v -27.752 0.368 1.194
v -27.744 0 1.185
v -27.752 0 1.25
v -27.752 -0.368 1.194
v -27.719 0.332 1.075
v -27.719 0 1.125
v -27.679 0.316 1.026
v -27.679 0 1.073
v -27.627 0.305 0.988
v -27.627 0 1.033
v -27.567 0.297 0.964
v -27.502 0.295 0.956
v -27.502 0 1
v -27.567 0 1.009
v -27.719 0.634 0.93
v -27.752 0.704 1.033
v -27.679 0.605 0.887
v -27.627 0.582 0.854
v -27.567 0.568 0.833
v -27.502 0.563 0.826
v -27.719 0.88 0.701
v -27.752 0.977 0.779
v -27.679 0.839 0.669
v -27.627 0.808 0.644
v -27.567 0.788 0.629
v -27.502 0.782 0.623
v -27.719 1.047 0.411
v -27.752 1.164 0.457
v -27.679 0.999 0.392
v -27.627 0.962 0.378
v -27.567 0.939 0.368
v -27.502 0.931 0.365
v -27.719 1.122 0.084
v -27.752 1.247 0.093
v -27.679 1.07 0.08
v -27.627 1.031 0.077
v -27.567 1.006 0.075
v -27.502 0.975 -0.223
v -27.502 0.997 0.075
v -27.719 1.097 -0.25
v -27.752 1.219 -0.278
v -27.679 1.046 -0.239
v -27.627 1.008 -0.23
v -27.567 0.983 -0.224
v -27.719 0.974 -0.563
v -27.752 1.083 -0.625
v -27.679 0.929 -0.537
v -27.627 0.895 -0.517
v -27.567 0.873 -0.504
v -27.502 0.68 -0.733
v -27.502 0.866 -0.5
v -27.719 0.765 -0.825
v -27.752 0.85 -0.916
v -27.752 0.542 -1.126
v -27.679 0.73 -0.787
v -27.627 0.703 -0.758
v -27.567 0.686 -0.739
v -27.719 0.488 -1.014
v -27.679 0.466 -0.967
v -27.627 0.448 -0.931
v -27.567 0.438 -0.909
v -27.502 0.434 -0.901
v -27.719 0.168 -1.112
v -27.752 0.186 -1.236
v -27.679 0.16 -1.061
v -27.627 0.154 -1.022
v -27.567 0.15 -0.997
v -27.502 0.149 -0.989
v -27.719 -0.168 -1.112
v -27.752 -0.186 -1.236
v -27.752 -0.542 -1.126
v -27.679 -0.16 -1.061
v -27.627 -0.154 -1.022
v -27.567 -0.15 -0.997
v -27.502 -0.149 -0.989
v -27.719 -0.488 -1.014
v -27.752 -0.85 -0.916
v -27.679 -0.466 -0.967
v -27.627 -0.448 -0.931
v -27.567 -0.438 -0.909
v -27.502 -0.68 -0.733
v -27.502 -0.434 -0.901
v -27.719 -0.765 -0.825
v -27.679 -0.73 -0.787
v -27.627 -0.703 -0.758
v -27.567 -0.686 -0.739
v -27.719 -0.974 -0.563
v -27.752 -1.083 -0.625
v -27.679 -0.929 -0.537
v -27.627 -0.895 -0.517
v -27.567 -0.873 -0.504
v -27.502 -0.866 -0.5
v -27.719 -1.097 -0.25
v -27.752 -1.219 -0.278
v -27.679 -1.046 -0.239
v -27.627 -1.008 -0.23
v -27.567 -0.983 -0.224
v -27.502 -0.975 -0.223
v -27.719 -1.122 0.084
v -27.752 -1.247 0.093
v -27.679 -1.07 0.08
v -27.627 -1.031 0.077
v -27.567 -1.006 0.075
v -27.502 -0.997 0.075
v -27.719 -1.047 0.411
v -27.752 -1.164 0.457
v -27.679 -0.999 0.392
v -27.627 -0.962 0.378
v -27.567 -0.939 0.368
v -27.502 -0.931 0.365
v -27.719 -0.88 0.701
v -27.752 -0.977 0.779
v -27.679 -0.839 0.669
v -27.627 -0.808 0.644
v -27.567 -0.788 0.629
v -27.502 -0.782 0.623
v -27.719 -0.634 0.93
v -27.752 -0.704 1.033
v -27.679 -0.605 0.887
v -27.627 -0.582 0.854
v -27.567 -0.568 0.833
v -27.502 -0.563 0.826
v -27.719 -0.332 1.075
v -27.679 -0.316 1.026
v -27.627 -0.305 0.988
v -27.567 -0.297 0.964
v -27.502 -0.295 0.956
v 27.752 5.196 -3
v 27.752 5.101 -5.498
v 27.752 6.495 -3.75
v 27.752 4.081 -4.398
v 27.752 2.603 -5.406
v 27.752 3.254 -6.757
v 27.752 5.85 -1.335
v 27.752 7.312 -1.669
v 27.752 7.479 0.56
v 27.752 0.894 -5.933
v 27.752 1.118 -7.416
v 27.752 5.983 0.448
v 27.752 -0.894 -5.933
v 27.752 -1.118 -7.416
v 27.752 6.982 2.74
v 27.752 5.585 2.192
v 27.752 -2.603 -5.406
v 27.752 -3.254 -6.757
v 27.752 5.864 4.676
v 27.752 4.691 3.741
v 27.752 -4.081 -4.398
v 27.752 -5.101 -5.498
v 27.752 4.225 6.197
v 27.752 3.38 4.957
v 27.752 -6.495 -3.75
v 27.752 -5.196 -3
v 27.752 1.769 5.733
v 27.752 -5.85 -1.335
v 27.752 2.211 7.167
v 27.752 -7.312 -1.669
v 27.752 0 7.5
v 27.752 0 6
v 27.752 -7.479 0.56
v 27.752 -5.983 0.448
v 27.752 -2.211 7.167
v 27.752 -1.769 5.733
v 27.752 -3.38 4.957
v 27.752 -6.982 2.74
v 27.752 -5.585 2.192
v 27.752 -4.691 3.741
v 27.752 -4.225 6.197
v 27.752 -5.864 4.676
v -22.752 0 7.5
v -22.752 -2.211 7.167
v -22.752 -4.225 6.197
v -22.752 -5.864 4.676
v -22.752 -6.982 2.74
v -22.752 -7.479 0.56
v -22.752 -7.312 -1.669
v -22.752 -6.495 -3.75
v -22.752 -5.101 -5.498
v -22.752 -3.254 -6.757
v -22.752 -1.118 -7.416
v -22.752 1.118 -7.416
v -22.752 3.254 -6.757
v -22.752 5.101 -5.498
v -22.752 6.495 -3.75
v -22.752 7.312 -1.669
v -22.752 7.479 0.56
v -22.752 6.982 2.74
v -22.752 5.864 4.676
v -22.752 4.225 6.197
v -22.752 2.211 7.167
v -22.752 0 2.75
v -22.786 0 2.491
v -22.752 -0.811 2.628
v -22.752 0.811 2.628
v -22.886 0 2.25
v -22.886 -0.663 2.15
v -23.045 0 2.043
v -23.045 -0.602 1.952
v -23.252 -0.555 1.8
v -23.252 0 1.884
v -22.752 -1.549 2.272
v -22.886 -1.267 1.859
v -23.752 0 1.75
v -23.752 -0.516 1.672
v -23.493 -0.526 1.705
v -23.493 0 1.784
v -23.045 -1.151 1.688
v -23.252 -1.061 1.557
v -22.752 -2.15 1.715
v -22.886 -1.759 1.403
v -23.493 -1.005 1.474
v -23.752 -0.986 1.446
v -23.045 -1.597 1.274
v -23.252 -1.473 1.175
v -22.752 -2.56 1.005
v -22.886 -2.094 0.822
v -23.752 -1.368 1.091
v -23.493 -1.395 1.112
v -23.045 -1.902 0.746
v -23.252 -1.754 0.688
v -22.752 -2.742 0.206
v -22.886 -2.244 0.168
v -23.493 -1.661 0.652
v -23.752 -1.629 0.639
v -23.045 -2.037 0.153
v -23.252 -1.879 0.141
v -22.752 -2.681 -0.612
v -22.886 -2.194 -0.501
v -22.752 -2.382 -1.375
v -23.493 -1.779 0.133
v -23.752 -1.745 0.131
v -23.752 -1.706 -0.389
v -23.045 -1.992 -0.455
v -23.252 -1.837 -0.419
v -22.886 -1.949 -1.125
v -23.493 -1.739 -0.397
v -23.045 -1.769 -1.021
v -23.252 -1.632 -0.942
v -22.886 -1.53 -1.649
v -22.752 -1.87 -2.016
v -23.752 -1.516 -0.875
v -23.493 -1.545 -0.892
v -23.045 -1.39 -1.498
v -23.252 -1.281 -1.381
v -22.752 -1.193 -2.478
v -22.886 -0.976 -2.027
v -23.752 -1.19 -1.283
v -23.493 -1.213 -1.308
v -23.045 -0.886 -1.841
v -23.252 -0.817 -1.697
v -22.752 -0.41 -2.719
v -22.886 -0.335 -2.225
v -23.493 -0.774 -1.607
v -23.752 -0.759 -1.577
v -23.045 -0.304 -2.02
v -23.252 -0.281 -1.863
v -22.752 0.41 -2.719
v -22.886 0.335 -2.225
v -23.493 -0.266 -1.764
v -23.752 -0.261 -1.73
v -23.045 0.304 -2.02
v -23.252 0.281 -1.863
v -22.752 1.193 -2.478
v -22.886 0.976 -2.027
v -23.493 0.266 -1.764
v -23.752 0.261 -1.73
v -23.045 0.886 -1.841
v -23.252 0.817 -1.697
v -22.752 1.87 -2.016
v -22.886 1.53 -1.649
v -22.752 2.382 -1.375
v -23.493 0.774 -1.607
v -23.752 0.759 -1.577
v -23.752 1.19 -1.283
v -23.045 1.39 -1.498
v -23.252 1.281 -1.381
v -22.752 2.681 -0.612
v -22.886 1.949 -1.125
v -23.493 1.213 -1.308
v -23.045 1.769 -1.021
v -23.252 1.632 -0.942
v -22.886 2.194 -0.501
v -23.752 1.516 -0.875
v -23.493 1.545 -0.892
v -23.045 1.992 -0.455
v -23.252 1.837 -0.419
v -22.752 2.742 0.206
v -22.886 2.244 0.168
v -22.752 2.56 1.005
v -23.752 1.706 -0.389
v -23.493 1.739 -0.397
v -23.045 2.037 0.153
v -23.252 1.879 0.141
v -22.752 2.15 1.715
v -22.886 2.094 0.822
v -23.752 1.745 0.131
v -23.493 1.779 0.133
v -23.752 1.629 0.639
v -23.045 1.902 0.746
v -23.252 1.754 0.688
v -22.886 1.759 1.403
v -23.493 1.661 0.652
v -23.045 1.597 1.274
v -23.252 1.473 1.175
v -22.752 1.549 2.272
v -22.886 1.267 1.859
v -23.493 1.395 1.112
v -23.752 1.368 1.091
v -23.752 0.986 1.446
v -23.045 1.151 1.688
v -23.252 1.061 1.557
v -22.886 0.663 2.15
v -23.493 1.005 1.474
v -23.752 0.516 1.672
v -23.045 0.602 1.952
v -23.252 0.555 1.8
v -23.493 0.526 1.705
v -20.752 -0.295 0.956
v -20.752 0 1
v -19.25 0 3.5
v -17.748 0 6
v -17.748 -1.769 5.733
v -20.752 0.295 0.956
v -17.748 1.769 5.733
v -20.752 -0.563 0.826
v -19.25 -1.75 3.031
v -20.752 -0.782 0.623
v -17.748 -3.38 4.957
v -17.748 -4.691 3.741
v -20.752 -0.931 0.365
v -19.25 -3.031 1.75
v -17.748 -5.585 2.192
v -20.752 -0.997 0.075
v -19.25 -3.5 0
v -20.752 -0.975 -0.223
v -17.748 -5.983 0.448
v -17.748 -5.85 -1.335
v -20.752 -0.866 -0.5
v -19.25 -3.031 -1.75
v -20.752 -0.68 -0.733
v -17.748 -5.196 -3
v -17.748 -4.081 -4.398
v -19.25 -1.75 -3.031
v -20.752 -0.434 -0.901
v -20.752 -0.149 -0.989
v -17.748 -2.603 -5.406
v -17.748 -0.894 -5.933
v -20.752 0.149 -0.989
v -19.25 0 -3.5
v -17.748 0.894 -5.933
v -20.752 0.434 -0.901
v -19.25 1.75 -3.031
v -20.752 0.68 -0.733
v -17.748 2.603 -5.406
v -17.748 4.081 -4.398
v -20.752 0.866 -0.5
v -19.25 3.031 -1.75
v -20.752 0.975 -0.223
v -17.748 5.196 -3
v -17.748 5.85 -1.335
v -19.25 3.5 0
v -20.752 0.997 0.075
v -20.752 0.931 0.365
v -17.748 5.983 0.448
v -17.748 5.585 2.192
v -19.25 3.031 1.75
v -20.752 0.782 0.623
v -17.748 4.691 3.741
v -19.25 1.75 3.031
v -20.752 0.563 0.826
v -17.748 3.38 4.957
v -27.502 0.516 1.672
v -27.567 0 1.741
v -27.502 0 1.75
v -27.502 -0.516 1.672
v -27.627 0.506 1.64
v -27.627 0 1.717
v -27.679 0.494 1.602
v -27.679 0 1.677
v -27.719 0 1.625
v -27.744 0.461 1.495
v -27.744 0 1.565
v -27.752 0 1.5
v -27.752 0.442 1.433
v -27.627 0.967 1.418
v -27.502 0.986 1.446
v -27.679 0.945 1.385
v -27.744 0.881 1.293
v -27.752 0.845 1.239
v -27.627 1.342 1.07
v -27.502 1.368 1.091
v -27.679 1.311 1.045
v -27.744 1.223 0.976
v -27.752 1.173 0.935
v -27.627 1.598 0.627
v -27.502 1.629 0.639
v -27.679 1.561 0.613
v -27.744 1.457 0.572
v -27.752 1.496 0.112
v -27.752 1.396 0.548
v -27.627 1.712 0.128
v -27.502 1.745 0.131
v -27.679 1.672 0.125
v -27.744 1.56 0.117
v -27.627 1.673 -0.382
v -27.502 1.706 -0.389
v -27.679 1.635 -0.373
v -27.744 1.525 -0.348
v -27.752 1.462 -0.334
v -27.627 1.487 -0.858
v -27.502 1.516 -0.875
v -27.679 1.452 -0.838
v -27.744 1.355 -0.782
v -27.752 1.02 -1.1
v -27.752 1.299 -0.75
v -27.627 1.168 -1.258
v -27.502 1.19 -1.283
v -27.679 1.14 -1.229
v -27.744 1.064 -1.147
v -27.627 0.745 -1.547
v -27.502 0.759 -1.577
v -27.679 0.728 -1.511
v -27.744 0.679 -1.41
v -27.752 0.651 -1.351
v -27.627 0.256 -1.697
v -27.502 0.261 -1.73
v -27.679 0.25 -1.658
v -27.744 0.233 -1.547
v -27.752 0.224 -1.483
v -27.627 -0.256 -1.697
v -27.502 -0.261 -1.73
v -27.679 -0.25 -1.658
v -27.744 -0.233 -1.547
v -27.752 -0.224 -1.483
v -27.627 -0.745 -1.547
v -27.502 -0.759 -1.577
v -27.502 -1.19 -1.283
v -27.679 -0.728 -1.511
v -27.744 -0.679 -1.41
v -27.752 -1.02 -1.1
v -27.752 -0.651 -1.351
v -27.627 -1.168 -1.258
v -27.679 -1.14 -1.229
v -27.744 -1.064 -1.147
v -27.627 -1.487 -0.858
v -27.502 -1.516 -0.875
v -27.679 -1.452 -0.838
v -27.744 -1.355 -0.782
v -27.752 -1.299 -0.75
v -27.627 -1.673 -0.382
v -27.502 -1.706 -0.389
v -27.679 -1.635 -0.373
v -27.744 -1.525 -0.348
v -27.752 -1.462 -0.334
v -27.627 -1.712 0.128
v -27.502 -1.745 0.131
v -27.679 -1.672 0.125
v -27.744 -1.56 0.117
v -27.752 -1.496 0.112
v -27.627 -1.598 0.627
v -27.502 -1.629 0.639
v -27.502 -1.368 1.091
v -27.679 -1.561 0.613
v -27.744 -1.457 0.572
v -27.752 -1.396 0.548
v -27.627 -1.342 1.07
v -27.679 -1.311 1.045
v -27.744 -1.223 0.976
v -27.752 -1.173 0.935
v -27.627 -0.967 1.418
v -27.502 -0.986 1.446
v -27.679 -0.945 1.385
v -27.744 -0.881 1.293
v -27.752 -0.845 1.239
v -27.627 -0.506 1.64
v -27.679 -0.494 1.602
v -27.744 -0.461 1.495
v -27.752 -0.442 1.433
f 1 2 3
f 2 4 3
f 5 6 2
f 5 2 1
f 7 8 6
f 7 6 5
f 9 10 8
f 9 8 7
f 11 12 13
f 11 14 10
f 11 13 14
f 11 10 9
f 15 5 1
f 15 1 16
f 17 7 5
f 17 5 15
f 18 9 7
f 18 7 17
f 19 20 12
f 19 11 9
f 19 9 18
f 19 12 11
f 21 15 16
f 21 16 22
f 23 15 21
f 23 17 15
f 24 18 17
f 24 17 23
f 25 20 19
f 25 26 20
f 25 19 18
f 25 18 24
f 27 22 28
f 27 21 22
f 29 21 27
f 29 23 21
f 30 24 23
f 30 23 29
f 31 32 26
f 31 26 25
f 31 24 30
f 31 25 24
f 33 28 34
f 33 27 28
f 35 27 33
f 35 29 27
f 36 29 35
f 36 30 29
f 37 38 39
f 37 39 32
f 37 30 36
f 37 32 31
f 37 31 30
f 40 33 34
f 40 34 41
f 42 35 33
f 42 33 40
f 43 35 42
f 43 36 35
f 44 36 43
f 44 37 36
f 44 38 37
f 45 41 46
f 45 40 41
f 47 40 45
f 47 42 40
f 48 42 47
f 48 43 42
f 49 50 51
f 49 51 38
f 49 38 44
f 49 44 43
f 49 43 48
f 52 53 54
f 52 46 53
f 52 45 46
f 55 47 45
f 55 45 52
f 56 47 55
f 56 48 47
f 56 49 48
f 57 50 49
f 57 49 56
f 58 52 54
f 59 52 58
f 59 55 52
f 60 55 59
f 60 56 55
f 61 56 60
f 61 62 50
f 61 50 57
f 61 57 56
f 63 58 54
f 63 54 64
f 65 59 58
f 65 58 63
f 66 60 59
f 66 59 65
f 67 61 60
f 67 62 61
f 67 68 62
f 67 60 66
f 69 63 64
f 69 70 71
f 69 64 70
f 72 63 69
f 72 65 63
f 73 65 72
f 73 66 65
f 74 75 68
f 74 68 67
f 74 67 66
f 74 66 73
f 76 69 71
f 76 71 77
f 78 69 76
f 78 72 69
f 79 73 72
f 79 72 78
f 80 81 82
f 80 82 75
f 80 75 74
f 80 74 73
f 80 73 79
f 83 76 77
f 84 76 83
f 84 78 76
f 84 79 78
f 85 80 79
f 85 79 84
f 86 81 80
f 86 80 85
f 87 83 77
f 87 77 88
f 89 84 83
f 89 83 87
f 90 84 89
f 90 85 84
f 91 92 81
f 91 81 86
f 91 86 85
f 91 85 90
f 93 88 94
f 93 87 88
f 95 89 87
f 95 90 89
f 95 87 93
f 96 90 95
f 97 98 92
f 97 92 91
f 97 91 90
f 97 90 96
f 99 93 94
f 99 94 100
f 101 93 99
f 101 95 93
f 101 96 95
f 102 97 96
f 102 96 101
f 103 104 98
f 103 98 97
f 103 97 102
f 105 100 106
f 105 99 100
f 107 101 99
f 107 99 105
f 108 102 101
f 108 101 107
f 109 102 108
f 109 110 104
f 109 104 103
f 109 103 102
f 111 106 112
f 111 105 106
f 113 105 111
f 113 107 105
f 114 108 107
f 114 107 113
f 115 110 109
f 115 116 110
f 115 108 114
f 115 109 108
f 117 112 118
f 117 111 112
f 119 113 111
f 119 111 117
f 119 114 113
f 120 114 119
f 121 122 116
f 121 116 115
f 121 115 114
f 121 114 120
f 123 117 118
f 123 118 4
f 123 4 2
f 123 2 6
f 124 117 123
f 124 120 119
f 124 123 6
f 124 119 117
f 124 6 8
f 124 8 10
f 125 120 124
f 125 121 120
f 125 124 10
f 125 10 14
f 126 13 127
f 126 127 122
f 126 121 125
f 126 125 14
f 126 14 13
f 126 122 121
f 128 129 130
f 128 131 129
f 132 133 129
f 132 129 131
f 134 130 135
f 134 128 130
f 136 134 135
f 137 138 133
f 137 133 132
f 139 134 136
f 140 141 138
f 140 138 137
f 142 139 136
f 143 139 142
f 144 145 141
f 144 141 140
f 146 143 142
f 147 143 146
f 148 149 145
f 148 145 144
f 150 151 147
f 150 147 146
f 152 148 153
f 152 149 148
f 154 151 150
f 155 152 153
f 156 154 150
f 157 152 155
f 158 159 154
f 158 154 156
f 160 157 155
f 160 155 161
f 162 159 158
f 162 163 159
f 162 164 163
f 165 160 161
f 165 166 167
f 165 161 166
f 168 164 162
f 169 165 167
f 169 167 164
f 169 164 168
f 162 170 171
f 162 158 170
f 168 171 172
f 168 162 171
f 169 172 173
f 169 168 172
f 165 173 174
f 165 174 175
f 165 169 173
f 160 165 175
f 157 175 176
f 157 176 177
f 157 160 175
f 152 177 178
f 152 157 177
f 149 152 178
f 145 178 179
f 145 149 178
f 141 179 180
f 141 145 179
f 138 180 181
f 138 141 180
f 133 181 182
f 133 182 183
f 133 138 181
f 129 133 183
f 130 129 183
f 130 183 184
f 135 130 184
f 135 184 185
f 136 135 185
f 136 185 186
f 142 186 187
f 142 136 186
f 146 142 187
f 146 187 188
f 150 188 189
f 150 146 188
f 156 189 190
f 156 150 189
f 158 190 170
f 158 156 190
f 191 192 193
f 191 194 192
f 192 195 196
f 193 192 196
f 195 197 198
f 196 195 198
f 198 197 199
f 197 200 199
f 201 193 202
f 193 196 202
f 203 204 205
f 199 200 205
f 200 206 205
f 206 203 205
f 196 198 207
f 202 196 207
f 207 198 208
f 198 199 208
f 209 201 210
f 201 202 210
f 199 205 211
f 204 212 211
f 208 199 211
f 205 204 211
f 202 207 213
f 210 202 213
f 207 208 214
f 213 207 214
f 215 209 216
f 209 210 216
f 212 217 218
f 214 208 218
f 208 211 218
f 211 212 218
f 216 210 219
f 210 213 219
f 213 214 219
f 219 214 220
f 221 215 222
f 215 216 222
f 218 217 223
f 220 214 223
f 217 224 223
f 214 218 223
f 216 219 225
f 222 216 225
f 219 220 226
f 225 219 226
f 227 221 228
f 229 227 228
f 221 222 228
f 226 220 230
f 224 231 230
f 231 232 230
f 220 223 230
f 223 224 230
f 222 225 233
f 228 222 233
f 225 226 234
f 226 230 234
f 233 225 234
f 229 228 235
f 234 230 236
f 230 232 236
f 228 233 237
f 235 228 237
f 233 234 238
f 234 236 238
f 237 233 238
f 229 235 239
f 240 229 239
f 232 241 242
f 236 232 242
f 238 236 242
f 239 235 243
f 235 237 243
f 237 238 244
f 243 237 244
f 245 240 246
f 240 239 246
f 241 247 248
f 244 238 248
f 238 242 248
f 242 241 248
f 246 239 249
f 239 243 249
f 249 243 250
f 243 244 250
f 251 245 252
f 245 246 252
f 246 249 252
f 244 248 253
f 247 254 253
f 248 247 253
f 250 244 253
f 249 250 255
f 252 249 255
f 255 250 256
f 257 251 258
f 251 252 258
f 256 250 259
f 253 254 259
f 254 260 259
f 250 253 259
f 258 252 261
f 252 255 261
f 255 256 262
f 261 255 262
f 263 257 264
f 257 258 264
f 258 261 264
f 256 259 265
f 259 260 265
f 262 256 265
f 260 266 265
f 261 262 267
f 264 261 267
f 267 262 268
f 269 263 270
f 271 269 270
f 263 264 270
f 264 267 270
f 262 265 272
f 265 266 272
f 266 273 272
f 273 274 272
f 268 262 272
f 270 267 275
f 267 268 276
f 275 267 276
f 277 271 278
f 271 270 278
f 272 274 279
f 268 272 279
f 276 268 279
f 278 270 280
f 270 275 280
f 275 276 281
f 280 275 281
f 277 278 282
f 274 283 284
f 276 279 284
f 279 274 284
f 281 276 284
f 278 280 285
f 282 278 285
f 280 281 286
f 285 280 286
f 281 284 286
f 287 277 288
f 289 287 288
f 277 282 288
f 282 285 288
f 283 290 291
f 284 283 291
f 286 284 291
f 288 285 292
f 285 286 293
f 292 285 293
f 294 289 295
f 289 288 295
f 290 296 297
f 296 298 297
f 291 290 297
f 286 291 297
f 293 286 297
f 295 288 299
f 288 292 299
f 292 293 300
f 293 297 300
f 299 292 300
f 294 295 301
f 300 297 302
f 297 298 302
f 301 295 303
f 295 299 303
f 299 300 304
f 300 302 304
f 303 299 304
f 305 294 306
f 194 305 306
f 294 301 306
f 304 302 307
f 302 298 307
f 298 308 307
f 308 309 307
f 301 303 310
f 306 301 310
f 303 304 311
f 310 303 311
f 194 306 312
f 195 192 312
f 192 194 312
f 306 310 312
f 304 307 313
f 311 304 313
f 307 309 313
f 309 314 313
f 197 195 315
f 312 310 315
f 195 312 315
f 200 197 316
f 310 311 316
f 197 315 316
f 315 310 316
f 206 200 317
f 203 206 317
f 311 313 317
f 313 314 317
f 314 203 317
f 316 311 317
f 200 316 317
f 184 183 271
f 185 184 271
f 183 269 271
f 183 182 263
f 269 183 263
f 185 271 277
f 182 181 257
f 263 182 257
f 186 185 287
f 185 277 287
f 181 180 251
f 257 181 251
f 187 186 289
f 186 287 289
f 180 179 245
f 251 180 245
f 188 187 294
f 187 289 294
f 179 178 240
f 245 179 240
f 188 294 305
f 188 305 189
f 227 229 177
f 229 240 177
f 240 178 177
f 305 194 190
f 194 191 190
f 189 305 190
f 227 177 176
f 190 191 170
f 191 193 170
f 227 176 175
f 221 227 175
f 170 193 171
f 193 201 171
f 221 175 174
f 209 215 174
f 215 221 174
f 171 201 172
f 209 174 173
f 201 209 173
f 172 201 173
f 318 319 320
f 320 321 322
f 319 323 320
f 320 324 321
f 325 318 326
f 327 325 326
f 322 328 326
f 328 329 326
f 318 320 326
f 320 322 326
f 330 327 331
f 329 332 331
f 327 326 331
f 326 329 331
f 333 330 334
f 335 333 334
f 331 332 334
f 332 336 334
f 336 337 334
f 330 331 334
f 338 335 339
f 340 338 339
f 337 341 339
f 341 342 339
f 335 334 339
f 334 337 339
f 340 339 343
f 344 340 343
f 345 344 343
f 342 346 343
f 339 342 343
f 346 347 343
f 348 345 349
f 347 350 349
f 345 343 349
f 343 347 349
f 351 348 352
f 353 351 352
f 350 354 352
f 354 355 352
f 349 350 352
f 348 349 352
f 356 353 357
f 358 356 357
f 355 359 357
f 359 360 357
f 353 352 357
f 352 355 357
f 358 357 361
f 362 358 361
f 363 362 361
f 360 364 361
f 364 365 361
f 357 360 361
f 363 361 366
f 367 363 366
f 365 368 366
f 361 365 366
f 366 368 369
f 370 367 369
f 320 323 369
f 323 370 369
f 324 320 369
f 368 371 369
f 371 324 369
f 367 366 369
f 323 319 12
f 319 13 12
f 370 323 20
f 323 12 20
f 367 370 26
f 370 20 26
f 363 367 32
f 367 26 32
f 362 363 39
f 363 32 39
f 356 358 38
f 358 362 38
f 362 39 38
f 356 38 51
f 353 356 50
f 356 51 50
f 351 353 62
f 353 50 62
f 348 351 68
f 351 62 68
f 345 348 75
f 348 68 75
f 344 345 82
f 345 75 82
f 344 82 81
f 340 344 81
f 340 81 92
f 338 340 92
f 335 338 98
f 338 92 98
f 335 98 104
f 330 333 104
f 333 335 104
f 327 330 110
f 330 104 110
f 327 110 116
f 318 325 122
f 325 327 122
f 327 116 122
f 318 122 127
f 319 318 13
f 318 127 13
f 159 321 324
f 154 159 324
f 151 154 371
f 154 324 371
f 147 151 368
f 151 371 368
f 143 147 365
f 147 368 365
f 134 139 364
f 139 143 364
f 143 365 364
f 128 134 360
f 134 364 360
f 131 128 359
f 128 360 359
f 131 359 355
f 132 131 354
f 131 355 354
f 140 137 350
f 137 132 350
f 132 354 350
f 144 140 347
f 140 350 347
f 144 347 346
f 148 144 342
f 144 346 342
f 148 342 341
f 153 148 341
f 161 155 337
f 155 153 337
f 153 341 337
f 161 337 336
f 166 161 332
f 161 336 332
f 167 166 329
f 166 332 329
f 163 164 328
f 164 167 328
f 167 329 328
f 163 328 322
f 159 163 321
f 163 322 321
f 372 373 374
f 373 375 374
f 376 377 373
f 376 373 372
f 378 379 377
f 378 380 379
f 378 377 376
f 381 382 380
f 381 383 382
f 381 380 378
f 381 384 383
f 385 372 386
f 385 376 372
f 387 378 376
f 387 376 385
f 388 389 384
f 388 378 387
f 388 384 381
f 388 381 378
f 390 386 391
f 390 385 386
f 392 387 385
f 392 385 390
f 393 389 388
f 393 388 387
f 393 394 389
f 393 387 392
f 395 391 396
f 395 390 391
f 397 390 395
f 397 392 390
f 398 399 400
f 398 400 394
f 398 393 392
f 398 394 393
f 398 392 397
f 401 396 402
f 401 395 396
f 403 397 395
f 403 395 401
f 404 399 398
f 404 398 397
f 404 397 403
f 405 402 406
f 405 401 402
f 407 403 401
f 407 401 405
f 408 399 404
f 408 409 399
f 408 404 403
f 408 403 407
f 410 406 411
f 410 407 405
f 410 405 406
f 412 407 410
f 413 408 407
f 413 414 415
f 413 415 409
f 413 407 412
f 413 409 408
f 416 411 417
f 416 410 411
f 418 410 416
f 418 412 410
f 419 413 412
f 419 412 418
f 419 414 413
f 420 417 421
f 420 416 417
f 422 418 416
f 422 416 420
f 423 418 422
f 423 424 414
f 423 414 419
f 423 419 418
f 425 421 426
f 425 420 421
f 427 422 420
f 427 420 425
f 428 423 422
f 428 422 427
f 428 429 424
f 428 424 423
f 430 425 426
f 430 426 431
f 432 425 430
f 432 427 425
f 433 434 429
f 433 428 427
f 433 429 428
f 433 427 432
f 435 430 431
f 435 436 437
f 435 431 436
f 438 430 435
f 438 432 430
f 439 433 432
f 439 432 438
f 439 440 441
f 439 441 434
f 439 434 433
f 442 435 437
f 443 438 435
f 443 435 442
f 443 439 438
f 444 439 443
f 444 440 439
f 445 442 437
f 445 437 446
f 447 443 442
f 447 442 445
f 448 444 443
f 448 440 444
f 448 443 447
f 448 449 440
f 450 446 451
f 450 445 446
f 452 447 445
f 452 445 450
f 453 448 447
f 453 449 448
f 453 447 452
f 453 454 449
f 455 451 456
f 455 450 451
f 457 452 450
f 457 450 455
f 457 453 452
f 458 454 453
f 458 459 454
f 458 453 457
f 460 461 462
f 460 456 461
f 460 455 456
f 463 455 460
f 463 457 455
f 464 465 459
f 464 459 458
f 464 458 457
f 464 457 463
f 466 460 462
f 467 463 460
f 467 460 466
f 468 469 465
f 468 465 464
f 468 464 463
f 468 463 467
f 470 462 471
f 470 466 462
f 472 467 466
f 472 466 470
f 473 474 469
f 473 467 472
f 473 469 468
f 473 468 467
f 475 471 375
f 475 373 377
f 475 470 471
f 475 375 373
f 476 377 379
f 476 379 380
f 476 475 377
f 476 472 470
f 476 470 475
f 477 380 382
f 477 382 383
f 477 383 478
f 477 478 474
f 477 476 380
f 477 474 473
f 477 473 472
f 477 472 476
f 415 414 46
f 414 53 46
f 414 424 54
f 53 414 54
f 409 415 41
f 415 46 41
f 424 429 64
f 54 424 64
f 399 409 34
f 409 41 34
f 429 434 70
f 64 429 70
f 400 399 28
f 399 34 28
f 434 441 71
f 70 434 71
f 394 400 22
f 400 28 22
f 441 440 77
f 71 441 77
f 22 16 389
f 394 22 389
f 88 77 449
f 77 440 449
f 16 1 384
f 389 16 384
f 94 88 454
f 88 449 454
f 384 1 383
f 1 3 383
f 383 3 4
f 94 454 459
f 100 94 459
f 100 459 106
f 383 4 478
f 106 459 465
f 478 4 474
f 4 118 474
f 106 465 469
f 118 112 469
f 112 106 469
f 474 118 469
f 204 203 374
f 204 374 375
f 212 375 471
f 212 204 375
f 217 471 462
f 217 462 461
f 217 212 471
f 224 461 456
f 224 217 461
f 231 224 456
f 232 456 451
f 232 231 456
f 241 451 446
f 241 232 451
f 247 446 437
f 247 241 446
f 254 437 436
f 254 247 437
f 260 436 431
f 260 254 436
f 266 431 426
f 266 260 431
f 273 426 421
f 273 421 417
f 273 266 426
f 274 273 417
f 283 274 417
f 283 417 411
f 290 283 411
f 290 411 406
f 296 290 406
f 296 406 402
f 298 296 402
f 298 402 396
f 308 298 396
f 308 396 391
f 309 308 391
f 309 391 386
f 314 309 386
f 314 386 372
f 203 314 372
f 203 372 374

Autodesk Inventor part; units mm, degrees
ref_plane "YZ Plane" through (0, 0, 0) normal (1, 0, 0) x (0, 1, 0)
ref_plane "XZ Plane" through (0, 0, 0) normal (0, 1, 0) x (-1, 0, 0)
ref_plane "XY Plane" through (0, 0, 0) normal (0, 0, 1) x (1, 0, 0)
sketch "Sketch1" plane through (0, 0, 0) normal (0, 1, 0) x (-1, 0, 0)
  line L0 (22.7522, 7.5) -> (-27.7522, 7.5)
  line L1 (-27.7522, 7.5) -> (-27.7522, 6)
  line L2 (-27.7522, 6) -> (17.7478, 6)
  line L3 (17.7478, 6) -> (20.7522, 1)
  line L4 (20.7522, 1) -> (27.7522, 1)
  line L5 (27.7522, 1) -> (27.7522, 1.75)
  line L6 (27.7522, 1.75) -> (22.7522, 1.75)
  line L7 (22.7522, 1.75) -> (22.7522, 7.5)
  line L8 (27.7522, 0) -> (-27.7522, 0)
  point P0 (0, 0)
  point P1 (0, 0)
  dimension "d0" = 2
  dimension "d1" = 3.5
  dimension "d2" = 5
  dimension "d3" = 59
  dimension "d5" = 1.5
  dimension "d6" = 2
  dimension "d13" = 12
  dimension "d14" = 45.5
revolve "Revolution1" add sketch "Sketch1" angle 360 about axis through (-27.7522, 0, 0) along (1, 0, 0)
fillet "Fillet1" radius 1 1 edges at (-22.7522, 0, -1.75)
fillet "Fillet1" radius 0.25 2 edges at (-27.7522, 0, -1.75) (-27.7522, 0, -1)
thread "Thread1" size "M12x0.5" class "6H" standard "ANSI Metric M Profile" length 3
properties part number "PayloadGermination_Syringe" material "Polycarbonate, Clear"
